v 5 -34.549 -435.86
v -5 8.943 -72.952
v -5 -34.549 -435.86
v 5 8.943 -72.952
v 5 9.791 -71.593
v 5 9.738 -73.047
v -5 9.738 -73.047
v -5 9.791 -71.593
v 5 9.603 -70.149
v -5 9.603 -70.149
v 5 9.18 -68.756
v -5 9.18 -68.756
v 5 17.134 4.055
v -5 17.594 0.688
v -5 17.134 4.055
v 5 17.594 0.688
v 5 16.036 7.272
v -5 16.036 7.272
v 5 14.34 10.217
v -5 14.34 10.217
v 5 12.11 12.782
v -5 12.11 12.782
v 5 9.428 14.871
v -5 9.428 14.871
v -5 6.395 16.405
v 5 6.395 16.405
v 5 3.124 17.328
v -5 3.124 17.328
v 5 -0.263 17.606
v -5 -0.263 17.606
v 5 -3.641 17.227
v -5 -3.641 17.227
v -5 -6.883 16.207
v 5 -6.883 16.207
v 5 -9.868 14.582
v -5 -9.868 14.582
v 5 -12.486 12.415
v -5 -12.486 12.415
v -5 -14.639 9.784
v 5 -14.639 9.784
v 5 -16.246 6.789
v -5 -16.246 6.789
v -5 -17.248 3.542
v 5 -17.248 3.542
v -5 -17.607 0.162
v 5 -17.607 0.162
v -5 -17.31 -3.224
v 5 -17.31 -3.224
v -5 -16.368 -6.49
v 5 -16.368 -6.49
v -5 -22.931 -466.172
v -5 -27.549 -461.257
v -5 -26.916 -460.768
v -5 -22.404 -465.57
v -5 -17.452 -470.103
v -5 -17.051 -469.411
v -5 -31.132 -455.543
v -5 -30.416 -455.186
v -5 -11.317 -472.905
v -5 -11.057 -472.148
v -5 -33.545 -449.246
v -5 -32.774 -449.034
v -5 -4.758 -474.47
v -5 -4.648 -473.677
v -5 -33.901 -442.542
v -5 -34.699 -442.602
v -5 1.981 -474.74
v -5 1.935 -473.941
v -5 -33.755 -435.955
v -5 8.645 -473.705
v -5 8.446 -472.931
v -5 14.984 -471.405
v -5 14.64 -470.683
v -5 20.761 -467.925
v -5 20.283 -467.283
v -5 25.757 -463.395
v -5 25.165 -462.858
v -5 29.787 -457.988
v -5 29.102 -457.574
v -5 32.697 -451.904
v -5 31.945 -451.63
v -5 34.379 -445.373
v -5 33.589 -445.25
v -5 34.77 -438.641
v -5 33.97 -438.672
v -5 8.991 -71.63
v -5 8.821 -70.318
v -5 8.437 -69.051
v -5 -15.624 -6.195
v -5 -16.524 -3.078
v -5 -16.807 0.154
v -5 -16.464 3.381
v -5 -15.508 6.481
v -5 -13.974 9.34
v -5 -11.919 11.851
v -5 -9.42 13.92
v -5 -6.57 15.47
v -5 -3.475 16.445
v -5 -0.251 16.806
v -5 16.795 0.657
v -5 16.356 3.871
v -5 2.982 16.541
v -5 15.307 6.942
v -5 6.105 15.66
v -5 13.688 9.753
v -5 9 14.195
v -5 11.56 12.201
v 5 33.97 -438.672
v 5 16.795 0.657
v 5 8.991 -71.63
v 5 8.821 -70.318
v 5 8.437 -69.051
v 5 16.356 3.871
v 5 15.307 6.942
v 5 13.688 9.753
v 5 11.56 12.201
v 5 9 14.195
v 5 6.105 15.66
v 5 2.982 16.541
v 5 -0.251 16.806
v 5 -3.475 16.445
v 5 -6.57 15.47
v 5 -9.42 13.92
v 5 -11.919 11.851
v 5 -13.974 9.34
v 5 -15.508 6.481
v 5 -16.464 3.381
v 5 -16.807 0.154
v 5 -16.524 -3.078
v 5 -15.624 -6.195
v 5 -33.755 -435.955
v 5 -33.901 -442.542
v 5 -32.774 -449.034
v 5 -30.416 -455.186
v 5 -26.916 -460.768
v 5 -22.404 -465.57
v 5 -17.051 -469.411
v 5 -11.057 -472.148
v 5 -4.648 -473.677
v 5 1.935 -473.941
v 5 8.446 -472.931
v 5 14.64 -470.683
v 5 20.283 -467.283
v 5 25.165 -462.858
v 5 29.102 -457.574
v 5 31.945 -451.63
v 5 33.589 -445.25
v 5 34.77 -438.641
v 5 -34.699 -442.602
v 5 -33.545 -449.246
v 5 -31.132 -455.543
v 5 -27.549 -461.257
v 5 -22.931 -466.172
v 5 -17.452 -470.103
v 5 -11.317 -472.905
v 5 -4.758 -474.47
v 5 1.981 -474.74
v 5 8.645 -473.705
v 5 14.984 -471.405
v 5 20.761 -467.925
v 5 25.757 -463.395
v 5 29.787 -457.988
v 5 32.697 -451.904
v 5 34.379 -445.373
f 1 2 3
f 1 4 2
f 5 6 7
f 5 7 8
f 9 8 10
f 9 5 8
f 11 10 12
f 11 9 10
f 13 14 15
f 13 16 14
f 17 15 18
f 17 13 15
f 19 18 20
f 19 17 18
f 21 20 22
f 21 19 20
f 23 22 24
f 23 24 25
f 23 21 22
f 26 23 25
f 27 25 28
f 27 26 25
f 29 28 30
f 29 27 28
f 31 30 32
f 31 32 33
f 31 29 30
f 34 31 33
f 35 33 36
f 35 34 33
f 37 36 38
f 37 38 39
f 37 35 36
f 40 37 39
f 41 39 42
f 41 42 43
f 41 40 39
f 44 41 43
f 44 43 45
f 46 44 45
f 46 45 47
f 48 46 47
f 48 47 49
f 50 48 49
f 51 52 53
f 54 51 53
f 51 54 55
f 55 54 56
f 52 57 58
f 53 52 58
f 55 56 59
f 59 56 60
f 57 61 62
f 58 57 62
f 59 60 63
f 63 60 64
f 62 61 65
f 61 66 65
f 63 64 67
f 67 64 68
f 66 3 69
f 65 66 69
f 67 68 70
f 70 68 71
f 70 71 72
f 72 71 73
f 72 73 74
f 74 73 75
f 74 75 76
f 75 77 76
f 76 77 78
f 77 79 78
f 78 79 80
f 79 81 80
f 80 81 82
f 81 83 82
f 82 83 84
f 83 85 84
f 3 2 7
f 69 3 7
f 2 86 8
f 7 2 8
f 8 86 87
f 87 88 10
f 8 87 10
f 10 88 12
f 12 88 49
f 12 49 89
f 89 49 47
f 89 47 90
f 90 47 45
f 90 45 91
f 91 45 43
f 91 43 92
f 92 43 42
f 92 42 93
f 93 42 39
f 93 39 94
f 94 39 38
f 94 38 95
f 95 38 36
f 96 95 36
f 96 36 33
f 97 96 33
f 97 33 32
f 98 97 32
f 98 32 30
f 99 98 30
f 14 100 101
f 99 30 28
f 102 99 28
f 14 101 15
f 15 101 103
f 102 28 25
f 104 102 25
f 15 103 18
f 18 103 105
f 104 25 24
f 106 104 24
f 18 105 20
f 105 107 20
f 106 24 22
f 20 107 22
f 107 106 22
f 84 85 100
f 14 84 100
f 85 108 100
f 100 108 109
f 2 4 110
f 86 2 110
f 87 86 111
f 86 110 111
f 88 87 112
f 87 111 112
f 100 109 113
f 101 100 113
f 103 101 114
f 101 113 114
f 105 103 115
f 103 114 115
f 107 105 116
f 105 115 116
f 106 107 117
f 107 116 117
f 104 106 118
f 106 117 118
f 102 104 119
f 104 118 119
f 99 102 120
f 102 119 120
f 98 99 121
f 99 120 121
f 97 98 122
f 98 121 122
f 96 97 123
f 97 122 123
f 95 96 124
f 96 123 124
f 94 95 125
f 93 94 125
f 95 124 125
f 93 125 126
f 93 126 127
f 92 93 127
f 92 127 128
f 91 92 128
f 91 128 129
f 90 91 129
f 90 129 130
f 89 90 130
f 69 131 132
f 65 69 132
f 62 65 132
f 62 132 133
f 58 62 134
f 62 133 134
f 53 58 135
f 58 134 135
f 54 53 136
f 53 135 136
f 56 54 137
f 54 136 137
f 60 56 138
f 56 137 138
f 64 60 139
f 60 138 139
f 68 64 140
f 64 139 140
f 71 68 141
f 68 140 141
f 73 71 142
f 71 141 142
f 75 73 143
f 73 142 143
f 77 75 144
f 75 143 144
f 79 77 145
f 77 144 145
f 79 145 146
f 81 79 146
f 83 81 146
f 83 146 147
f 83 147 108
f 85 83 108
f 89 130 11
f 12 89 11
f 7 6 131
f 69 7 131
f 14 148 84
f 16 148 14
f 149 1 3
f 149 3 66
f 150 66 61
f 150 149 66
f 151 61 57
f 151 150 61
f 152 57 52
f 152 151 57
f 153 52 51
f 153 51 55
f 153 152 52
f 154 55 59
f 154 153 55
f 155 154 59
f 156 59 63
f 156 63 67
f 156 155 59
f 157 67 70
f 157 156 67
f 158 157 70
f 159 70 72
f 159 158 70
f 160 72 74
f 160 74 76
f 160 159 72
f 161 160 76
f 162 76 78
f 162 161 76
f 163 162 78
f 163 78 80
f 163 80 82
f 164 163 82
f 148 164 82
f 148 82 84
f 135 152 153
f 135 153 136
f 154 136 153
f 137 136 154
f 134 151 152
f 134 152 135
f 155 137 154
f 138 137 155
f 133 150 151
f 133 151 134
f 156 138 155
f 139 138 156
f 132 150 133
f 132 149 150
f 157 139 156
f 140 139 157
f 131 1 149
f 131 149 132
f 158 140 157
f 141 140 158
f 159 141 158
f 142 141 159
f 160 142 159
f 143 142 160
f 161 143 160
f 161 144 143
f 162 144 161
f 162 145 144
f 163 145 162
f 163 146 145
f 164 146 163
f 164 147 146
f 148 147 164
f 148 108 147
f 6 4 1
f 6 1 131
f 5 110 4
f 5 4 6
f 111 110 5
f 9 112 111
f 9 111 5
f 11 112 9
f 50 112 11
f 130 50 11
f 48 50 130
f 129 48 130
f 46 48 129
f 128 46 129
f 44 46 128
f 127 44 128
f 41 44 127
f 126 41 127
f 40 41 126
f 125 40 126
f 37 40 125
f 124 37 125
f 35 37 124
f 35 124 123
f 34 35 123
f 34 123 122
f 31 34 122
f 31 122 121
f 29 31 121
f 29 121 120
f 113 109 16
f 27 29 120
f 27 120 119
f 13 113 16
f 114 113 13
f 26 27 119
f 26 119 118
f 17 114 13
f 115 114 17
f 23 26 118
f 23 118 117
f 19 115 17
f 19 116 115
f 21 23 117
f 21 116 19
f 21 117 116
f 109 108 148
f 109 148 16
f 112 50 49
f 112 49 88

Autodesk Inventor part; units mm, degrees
ref_plane "YZ Plane" through (0, 0, 0) normal (1, 0, 0) x (0, 1, 0)
ref_plane "XZ Plane" through (0, 0, 0) normal (0, 1, 0) x (-1, 0, 0)
ref_plane "XY Plane" through (0, 0, 0) normal (0, 0, 1) x (1, 0, 0)
sketch "スケッチ1" plane through (0, 0, 0) normal (1, 0, 0) x (0, 1, 0)
  arc A0 (17.1756, 0.6715) -> (-15.9786, -6.3353) centre (0, 0) ccw
  arc A1 (-34.1332, -435.9093) -> (34.3512, -438.657) centre (0, -440) ccw
  arc A2 (9.3592, -73.0018) -> (8.8263, -68.897) centre (1, -72) ccw
  line L0 (8.8263, -68.897) -> (-15.9786, -6.3353)
  line L1 (34.3512, -438.657) -> (17.1756, 0.6715)
  line L2 (9.3592, -73.0018) -> (-34.1332, -435.9093)
  arc A3 (17.5943, 0.6879) -> (-16.3681, -6.4898) centre (0, 0) ccw
  line L3 (-16.3681, -6.4898) -> (8.4368, -69.0514)
  arc A4 (8.9432, -72.9519) -> (8.4368, -69.0514) centre (1, -72) ccw
  line L4 (8.9432, -72.9519) -> (-34.5492, -435.8595)
  arc A5 (-34.5492, -435.8595) -> (34.7699, -438.6407) centre (0, -440) ccw
  line L5 (34.7699, -438.6407) -> (17.5943, 0.6879)
  arc A6 (16.7949, 0.6566) -> (-15.6244, -6.1949) centre (0, 0) ccw
  line L6 (-15.6244, -6.1949) -> (9.1805, -68.7565)
  arc A7 (9.7375, -73.0471) -> (9.1805, -68.7565) centre (1, -72) ccw
  line L7 (9.7375, -73.0471) -> (-33.7549, -435.9547)
  arc A8 (-33.7549, -435.9547) -> (33.9705, -438.6719) centre (0, -440) ccw
  line L8 (33.9705, -438.6719) -> (16.7949, 0.6566)
  dimension "d0" = 34.3775
  dimension "d1" = 68.7549
  dimension "d2" = 440
  dimension "d24" = 0.419
  dimension "d25" = 8
  dimension "d26" = 72
  dimension "d27" = 0.8
  dimension "d32" = 1
extrude "押し出し1" add sketch "スケッチ1" along normal mid plane 10 contours L1 A1 L2 A2 L0 A0 | L5 A5 L4 A4 L3 A3
properties part number "belt_2" material "ゴム"
